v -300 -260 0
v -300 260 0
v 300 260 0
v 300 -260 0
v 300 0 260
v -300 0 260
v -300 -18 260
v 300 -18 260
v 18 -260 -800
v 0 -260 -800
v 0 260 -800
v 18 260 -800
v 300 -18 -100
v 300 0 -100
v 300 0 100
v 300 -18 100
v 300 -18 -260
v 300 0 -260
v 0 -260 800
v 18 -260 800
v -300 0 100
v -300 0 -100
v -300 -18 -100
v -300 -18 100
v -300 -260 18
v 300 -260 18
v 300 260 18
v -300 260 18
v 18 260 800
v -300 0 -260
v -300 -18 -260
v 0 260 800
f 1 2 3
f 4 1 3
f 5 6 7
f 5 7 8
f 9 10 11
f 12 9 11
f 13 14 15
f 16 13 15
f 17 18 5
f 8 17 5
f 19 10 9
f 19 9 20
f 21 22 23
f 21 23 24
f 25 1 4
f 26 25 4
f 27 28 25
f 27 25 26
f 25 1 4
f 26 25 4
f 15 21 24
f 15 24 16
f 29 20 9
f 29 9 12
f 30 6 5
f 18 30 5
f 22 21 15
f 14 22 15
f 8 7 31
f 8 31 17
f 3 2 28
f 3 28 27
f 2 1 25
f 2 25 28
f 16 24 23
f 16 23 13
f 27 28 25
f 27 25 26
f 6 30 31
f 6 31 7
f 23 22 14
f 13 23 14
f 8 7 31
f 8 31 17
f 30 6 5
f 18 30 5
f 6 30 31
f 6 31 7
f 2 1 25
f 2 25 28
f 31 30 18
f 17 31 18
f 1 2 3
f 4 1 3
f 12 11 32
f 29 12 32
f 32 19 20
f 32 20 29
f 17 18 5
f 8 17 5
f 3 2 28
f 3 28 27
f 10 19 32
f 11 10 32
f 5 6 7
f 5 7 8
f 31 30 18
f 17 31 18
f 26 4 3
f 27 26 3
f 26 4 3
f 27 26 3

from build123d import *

# Parameters (mm, degrees)
F0_W      = 520
F0_H      = 1600
F1_DEPTH  = 18
F2_W      = 600
F2_H      = 520
F3_DEPTH  = 18
F4_W      = 600
F4_H      = 520
F5_DEPTH  = 18
F6_W      = 600
F6_H      = 200
F7_DEPTH  = 18
F8_W      = 600
F8_H      = 520
F9_DEPTH  = 18
F10_W     = 600
F10_H     = 520
F11_DEPTH = 18


with BuildPart() as f1:
    # F0 (on Right) → F1 (new body)
    with BuildSketch(Plane.YZ):
        Rectangle(F0_W, F0_H)
    extrude(amount=F1_DEPTH)


with BuildPart() as f3:
    # F2 (on Top) → F3 (new body)
    with BuildSketch(Plane.XY):
        Rectangle(F2_W, F2_H)
    extrude(amount=F3_DEPTH)


with BuildPart() as f5:
    # F4 (on Front) → F5 (new body)
    with BuildSketch(Plane.XZ):
        Rectangle(F4_W, F4_H)
    extrude(amount=F5_DEPTH)


with BuildPart() as f7:
    # F6 (on Front) → F7 (new body)
    with BuildSketch(Plane.XZ):
        Rectangle(F6_W, F6_H)
    extrude(amount=F7_DEPTH)


with BuildPart() as f9:
    # F8 (on Top) → F9 (new body)
    with BuildSketch(Plane.XY):
        Rectangle(F8_W, F8_H)
    extrude(amount=F9_DEPTH)


with BuildPart() as f11:
    # F10 (on Front) → F11 (new body)
    with BuildSketch(Plane.XZ):
        Rectangle(F10_W, F10_H)
    extrude(amount=F11_DEPTH)


solid = Compound([f1.part, f3.part, f5.part, f7.part, f9.part, f11.part])
